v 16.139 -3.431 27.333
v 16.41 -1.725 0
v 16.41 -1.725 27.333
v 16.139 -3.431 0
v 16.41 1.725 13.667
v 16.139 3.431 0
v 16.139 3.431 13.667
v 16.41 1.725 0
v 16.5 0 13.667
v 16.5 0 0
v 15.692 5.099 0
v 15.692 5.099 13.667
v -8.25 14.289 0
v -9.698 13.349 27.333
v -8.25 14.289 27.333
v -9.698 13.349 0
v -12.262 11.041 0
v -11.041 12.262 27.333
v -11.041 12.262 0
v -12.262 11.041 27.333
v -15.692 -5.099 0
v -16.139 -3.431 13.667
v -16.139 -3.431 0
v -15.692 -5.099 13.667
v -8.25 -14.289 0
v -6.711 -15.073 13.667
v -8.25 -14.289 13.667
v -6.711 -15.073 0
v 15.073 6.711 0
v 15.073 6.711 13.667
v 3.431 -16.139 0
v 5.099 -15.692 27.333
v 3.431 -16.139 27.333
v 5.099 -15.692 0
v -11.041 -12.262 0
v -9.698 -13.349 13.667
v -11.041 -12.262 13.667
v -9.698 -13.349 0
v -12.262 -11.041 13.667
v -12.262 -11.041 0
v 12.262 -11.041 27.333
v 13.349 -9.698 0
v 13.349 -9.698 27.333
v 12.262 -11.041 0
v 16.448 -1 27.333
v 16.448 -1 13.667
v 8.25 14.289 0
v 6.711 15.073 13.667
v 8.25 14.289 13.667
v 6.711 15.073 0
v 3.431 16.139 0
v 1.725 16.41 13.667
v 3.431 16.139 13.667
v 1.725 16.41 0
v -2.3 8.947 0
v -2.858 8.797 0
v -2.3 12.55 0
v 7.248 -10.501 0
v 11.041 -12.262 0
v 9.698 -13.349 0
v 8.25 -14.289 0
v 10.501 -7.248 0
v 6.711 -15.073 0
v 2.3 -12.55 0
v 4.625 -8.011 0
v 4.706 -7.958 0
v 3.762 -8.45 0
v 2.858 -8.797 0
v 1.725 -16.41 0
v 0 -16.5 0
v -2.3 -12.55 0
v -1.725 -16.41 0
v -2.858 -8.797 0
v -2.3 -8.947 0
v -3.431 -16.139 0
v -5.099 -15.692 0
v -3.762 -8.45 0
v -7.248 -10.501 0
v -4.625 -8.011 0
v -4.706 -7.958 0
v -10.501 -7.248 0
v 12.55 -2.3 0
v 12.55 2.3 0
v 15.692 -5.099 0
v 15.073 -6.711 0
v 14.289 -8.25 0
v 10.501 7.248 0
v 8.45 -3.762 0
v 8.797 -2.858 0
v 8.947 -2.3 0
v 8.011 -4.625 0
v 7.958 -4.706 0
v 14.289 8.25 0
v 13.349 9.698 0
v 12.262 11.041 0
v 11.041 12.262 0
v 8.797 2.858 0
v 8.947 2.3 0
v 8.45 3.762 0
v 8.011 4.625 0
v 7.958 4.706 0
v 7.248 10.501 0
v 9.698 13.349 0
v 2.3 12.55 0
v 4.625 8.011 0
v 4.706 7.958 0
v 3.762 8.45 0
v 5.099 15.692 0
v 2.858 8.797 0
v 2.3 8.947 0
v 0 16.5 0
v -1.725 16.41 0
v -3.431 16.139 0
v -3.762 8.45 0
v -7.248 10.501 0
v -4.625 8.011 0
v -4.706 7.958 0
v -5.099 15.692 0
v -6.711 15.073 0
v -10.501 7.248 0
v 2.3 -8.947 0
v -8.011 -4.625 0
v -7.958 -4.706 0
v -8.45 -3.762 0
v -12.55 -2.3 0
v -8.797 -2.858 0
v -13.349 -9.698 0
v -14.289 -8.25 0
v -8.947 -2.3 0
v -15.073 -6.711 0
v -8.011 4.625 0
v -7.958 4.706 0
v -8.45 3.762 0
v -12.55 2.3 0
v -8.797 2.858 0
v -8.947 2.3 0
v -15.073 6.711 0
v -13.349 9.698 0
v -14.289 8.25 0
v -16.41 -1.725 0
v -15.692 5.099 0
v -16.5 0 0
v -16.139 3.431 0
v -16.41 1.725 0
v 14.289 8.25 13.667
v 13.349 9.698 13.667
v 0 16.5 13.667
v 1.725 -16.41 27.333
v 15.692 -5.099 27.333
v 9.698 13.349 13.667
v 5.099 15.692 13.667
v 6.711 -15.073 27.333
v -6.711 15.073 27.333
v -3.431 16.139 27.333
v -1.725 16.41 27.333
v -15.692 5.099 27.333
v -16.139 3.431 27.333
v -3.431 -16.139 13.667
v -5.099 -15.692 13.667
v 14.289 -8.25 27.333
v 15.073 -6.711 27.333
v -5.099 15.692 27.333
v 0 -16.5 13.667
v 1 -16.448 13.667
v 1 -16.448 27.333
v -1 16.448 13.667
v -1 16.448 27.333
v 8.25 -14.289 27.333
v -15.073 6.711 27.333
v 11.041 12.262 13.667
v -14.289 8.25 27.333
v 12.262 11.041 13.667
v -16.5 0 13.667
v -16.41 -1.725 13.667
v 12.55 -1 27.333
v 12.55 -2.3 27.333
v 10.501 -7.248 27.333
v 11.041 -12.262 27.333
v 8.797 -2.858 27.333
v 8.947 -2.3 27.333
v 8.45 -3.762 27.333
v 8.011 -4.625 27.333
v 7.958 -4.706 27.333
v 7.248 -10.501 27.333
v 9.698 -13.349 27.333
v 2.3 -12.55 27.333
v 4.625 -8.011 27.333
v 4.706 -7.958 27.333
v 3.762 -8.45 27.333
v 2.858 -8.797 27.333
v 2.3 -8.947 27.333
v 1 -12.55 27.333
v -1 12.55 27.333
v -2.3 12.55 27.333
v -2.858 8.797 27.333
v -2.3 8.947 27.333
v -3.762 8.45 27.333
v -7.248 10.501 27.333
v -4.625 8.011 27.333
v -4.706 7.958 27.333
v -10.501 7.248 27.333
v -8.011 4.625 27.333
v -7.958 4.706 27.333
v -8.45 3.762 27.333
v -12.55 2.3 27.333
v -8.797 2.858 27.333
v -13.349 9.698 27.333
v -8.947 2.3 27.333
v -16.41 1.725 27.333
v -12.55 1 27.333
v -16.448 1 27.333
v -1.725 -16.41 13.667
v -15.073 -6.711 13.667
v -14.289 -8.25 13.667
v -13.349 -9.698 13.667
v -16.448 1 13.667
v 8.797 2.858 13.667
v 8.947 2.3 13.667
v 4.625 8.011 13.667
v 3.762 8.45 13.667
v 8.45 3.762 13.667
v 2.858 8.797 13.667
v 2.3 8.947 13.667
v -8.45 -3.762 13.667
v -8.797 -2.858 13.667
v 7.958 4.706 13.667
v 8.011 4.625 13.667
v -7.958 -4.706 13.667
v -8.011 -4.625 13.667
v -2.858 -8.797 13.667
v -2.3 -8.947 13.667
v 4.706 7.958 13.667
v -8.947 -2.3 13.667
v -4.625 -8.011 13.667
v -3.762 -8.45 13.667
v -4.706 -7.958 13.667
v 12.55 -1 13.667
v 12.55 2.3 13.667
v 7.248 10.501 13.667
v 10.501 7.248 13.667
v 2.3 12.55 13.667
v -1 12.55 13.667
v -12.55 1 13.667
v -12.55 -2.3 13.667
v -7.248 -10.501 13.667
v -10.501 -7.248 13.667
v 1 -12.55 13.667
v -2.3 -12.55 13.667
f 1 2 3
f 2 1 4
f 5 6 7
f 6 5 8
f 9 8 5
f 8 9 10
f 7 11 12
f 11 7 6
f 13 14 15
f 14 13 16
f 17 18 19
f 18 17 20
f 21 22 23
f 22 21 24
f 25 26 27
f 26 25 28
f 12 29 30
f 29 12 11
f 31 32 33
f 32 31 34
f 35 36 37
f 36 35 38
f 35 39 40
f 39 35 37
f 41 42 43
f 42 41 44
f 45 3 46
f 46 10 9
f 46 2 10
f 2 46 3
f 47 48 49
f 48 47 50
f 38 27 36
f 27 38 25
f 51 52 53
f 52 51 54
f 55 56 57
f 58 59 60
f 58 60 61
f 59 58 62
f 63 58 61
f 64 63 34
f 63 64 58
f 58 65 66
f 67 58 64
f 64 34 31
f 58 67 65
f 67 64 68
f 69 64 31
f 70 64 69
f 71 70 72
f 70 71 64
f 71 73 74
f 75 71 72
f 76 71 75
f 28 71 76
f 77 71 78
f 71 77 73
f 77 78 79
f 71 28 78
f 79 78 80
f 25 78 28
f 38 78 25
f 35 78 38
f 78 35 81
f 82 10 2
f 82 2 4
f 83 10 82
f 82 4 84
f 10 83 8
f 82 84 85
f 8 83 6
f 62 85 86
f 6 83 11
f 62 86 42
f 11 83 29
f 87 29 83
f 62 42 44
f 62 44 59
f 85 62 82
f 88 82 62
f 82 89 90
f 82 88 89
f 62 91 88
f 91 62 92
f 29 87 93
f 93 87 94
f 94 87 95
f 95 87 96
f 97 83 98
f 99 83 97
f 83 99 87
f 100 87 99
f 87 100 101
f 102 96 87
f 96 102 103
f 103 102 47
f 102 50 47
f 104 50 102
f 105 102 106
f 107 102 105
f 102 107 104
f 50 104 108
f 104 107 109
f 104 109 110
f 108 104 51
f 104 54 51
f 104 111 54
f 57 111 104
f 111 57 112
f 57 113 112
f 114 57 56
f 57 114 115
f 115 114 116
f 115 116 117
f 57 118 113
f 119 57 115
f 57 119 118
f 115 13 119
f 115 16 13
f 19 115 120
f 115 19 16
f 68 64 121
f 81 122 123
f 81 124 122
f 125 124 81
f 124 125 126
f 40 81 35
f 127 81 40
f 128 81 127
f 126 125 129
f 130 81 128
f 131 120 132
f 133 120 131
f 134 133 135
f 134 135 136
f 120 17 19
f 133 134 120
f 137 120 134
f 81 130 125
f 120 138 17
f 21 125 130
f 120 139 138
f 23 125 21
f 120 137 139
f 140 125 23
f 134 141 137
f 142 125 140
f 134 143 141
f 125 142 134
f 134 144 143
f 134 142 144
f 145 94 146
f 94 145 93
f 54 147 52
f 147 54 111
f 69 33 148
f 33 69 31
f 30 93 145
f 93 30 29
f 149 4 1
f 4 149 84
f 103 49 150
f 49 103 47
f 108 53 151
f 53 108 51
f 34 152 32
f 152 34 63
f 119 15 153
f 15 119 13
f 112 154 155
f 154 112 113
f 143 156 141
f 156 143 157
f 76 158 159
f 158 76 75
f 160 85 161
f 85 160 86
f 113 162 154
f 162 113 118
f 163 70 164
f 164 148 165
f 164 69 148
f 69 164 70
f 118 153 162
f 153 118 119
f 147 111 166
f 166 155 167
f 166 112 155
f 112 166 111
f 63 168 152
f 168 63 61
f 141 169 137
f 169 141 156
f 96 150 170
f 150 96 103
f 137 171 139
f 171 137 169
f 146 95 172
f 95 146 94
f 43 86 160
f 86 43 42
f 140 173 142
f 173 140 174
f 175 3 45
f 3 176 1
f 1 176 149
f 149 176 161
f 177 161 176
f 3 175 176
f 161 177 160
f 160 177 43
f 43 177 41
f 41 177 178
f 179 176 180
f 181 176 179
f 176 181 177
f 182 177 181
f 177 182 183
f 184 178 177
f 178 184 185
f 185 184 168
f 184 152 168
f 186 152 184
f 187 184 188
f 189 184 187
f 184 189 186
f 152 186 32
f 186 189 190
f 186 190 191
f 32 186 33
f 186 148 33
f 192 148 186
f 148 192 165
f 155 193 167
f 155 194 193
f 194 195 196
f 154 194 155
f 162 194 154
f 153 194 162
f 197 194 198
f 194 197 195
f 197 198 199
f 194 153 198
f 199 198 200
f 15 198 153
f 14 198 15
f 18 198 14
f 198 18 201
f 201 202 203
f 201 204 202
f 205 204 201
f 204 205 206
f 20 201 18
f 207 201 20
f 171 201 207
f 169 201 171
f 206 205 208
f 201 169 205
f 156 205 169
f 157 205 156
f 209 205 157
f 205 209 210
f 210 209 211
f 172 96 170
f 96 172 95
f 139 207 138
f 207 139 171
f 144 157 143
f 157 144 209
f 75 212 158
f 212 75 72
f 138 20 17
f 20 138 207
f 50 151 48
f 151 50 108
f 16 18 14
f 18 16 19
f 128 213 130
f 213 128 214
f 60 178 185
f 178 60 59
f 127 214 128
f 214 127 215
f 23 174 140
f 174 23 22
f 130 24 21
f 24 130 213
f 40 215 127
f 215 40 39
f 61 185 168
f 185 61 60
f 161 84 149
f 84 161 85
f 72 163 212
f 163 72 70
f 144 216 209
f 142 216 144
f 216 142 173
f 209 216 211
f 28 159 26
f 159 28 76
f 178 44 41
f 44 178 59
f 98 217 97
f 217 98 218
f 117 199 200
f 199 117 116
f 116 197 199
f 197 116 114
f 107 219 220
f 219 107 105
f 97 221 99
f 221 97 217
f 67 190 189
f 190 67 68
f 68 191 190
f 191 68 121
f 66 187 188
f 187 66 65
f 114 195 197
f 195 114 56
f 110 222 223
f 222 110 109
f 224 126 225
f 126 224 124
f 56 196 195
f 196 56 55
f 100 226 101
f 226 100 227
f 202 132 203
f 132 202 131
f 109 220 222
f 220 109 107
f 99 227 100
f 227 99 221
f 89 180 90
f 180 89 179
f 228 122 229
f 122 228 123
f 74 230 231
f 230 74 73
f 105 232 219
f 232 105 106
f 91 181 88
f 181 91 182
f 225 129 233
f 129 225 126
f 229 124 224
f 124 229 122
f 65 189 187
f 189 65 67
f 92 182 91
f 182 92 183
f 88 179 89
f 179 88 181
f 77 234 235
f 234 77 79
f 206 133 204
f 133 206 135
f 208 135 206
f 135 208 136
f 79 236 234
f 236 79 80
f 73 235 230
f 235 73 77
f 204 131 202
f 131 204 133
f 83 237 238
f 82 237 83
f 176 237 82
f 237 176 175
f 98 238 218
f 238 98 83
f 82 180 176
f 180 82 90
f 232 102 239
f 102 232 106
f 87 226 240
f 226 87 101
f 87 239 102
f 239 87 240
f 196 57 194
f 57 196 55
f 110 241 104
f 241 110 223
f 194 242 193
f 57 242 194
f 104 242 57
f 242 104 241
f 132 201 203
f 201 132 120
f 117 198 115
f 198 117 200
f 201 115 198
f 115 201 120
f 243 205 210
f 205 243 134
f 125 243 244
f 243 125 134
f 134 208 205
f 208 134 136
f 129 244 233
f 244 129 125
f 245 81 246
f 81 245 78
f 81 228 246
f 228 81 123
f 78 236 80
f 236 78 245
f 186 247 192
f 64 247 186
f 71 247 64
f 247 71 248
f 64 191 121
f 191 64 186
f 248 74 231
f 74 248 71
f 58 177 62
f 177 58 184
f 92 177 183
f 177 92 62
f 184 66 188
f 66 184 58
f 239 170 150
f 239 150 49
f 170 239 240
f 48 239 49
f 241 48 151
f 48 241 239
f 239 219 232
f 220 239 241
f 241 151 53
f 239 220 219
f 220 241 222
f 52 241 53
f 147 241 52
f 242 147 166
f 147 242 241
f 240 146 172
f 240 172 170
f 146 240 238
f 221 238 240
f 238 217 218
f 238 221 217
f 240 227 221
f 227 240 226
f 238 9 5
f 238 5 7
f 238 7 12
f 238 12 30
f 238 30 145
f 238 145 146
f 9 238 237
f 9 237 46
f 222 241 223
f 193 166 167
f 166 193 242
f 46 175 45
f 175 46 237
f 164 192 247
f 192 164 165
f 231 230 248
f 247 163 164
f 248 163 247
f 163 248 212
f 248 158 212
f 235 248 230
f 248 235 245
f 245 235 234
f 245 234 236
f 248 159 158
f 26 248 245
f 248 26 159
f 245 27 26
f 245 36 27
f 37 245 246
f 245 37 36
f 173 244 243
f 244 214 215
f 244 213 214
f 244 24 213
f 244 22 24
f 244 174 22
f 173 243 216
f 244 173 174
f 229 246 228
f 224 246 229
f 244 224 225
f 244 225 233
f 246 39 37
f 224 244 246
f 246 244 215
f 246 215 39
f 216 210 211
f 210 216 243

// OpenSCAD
$fn=60; 

outer_diameter = 33;
inner_diameter = 18.5;
height = 41;
spoke_depth = 4.3;
spoke_width = 4.6;
difference(){
    difference(){
        difference(){
        cylinder(height*(2/3),d=outer_diameter);
        cylinder(height*(2/3),d=inner_diameter);
        }

        for(angle=[0:45:360]){
            rotate([0,0,angle]){
                translate([(inner_diameter/2)+(spoke_depth/2)-2,0,height/2]){
                    cube([spoke_depth+2,spoke_width,height],center=true);
                }
            }
        }
    }
    
    translate([-1,-1,height*(1/3)]){
        cube([outer_diameter*2,outer_diameter*2,height*(1/3)]);
    }
    rotate([0,0,180]){
        translate([-1,-1,height*(1/3)]){
        cube([outer_diameter*2,outer_diameter*2,height*(1/3)]);
        }
    }
}
